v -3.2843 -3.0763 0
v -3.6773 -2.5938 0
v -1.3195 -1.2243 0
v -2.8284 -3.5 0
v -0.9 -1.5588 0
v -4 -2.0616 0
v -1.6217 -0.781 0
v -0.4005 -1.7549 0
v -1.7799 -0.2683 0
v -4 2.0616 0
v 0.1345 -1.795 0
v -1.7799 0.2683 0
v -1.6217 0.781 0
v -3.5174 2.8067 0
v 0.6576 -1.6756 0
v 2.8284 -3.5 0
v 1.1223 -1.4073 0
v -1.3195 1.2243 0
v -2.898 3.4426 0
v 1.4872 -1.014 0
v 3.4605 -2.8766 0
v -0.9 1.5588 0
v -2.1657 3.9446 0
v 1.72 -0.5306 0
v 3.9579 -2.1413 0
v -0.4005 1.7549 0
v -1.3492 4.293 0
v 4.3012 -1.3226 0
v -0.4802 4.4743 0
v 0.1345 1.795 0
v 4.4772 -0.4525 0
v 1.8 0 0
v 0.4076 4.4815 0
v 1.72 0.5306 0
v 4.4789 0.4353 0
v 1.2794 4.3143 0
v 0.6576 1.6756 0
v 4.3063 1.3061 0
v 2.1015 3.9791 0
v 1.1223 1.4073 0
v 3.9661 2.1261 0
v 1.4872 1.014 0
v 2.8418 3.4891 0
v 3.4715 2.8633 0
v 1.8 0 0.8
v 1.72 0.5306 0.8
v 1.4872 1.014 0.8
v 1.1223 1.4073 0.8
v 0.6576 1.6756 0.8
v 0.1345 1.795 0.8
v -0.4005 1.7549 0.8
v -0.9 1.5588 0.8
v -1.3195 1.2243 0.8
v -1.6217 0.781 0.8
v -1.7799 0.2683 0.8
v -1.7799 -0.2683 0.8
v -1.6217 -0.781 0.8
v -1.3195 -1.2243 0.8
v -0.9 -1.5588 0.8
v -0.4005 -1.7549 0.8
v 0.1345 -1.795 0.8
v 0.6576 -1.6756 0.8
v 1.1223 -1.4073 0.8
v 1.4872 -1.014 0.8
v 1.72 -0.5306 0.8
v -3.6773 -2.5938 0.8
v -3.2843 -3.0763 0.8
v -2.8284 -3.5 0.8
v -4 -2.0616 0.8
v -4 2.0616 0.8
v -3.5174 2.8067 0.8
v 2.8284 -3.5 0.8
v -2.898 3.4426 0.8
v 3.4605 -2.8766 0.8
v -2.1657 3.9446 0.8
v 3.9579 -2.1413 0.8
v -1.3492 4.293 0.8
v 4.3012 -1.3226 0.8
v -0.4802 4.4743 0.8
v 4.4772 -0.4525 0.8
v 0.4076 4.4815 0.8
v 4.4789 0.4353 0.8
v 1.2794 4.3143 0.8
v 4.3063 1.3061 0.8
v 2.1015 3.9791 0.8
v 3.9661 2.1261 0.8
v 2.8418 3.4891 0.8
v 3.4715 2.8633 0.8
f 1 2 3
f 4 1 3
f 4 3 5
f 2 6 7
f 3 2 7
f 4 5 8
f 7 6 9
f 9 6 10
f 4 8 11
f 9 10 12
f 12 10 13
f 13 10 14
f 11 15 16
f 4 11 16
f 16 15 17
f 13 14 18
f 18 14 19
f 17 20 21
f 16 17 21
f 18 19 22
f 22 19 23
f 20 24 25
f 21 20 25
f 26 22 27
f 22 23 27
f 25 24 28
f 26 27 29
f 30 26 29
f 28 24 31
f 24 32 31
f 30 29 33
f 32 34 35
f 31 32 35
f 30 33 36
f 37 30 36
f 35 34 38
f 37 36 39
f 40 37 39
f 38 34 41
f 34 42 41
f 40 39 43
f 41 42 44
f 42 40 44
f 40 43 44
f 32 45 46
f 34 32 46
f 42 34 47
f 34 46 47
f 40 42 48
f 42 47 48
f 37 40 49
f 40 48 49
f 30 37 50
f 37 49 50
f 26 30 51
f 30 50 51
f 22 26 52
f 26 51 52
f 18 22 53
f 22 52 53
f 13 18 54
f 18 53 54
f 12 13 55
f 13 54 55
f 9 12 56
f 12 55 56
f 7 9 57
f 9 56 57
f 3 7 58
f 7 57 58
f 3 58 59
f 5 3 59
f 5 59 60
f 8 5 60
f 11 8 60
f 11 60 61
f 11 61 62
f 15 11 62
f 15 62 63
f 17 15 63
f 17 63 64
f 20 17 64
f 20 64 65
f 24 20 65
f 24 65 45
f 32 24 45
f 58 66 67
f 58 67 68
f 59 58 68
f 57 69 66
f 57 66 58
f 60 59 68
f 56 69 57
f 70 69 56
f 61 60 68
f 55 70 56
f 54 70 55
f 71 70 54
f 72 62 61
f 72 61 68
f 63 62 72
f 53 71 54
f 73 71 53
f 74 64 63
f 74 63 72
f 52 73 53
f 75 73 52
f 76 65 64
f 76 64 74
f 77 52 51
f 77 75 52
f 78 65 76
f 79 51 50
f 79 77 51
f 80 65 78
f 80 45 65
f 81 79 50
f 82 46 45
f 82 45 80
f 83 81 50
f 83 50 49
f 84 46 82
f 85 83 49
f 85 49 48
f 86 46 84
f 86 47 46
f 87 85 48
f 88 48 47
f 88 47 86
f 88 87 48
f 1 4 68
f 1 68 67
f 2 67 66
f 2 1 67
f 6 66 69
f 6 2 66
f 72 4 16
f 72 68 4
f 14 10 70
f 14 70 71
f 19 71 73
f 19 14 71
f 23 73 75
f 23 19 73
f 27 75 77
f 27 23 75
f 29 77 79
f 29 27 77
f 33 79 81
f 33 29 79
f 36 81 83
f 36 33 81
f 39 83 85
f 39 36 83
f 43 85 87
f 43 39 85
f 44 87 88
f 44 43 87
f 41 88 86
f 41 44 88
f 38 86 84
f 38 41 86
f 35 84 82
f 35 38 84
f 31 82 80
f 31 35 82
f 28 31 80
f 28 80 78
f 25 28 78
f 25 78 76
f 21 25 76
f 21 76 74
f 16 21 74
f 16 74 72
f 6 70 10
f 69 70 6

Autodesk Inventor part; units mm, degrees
ref_plane "YZ Plane" through (0, 0, 0) normal (1, 0, 0) x (0, 1, 0)
ref_plane "XZ Plane" through (0, 0, 0) normal (0, 1, 0) x (-1, 0, 0)
ref_plane "XY Plane" through (0, 0, 0) normal (0, 0, 1) x (1, 0, 0)
sketch "Эскиз1" plane through (0, 0, 0) normal (0, 0, 1) x (1, 0, 0)
  circle A0 centre (0, 0) radius 4.5
  dimension "d0" = 9
extrude "Выдавливание1" add sketch "Эскиз1" along normal blind 0.8
sketch "Эскиз2" plane through (0, 0, 0.8) normal (0, 0, 1) x (1, 0, 0)
  circle A0 centre (0, 0) radius 1.8
  dimension "d3" = 3.6
extrude "Выдавливание2" cut sketch "Эскиз2" against normal blind 0.8
sketch "Эскиз3" plane through (0, 0, 0.8) normal (0, 0, 1) x (1, 0, 0)
  line L0 (0, 0) -> (0, -3.5)
  line L1 (0, 0) -> (-4, 0)
  circle A0 centre (0, 0) radius 4.5 projected
  line L2 (-4, -2.0616) -> (-5.2131, -2.0616)
  line L3 (-5.2131, -2.0616) -> (-5.2131, 3.1786)
  line L4 (-5.2131, 3.1786) -> (-4, 3.1786)
  line L5 (-4, 3.1786) -> (-4, -2.0616)
  line L6 (-2.8284, -3.5) -> (4.77, -3.5)
  line L7 (4.77, -3.5) -> (4.77, -5.6057)
  line L8 (4.77, -5.6057) -> (-2.8284, -5.6057)
  line L9 (-2.8284, -5.6057) -> (-2.8284, -3.5)
  dimension "d6" = 3.5
  dimension "d7" = 4
extrude "Выдавливание3" cut sketch "Эскиз3" against normal blind 10 contours L6 A0 | L5 A0 | A0 L6 L7 L8 L9 | L2 L3 L4 L5 A0
properties part number "shayba"
